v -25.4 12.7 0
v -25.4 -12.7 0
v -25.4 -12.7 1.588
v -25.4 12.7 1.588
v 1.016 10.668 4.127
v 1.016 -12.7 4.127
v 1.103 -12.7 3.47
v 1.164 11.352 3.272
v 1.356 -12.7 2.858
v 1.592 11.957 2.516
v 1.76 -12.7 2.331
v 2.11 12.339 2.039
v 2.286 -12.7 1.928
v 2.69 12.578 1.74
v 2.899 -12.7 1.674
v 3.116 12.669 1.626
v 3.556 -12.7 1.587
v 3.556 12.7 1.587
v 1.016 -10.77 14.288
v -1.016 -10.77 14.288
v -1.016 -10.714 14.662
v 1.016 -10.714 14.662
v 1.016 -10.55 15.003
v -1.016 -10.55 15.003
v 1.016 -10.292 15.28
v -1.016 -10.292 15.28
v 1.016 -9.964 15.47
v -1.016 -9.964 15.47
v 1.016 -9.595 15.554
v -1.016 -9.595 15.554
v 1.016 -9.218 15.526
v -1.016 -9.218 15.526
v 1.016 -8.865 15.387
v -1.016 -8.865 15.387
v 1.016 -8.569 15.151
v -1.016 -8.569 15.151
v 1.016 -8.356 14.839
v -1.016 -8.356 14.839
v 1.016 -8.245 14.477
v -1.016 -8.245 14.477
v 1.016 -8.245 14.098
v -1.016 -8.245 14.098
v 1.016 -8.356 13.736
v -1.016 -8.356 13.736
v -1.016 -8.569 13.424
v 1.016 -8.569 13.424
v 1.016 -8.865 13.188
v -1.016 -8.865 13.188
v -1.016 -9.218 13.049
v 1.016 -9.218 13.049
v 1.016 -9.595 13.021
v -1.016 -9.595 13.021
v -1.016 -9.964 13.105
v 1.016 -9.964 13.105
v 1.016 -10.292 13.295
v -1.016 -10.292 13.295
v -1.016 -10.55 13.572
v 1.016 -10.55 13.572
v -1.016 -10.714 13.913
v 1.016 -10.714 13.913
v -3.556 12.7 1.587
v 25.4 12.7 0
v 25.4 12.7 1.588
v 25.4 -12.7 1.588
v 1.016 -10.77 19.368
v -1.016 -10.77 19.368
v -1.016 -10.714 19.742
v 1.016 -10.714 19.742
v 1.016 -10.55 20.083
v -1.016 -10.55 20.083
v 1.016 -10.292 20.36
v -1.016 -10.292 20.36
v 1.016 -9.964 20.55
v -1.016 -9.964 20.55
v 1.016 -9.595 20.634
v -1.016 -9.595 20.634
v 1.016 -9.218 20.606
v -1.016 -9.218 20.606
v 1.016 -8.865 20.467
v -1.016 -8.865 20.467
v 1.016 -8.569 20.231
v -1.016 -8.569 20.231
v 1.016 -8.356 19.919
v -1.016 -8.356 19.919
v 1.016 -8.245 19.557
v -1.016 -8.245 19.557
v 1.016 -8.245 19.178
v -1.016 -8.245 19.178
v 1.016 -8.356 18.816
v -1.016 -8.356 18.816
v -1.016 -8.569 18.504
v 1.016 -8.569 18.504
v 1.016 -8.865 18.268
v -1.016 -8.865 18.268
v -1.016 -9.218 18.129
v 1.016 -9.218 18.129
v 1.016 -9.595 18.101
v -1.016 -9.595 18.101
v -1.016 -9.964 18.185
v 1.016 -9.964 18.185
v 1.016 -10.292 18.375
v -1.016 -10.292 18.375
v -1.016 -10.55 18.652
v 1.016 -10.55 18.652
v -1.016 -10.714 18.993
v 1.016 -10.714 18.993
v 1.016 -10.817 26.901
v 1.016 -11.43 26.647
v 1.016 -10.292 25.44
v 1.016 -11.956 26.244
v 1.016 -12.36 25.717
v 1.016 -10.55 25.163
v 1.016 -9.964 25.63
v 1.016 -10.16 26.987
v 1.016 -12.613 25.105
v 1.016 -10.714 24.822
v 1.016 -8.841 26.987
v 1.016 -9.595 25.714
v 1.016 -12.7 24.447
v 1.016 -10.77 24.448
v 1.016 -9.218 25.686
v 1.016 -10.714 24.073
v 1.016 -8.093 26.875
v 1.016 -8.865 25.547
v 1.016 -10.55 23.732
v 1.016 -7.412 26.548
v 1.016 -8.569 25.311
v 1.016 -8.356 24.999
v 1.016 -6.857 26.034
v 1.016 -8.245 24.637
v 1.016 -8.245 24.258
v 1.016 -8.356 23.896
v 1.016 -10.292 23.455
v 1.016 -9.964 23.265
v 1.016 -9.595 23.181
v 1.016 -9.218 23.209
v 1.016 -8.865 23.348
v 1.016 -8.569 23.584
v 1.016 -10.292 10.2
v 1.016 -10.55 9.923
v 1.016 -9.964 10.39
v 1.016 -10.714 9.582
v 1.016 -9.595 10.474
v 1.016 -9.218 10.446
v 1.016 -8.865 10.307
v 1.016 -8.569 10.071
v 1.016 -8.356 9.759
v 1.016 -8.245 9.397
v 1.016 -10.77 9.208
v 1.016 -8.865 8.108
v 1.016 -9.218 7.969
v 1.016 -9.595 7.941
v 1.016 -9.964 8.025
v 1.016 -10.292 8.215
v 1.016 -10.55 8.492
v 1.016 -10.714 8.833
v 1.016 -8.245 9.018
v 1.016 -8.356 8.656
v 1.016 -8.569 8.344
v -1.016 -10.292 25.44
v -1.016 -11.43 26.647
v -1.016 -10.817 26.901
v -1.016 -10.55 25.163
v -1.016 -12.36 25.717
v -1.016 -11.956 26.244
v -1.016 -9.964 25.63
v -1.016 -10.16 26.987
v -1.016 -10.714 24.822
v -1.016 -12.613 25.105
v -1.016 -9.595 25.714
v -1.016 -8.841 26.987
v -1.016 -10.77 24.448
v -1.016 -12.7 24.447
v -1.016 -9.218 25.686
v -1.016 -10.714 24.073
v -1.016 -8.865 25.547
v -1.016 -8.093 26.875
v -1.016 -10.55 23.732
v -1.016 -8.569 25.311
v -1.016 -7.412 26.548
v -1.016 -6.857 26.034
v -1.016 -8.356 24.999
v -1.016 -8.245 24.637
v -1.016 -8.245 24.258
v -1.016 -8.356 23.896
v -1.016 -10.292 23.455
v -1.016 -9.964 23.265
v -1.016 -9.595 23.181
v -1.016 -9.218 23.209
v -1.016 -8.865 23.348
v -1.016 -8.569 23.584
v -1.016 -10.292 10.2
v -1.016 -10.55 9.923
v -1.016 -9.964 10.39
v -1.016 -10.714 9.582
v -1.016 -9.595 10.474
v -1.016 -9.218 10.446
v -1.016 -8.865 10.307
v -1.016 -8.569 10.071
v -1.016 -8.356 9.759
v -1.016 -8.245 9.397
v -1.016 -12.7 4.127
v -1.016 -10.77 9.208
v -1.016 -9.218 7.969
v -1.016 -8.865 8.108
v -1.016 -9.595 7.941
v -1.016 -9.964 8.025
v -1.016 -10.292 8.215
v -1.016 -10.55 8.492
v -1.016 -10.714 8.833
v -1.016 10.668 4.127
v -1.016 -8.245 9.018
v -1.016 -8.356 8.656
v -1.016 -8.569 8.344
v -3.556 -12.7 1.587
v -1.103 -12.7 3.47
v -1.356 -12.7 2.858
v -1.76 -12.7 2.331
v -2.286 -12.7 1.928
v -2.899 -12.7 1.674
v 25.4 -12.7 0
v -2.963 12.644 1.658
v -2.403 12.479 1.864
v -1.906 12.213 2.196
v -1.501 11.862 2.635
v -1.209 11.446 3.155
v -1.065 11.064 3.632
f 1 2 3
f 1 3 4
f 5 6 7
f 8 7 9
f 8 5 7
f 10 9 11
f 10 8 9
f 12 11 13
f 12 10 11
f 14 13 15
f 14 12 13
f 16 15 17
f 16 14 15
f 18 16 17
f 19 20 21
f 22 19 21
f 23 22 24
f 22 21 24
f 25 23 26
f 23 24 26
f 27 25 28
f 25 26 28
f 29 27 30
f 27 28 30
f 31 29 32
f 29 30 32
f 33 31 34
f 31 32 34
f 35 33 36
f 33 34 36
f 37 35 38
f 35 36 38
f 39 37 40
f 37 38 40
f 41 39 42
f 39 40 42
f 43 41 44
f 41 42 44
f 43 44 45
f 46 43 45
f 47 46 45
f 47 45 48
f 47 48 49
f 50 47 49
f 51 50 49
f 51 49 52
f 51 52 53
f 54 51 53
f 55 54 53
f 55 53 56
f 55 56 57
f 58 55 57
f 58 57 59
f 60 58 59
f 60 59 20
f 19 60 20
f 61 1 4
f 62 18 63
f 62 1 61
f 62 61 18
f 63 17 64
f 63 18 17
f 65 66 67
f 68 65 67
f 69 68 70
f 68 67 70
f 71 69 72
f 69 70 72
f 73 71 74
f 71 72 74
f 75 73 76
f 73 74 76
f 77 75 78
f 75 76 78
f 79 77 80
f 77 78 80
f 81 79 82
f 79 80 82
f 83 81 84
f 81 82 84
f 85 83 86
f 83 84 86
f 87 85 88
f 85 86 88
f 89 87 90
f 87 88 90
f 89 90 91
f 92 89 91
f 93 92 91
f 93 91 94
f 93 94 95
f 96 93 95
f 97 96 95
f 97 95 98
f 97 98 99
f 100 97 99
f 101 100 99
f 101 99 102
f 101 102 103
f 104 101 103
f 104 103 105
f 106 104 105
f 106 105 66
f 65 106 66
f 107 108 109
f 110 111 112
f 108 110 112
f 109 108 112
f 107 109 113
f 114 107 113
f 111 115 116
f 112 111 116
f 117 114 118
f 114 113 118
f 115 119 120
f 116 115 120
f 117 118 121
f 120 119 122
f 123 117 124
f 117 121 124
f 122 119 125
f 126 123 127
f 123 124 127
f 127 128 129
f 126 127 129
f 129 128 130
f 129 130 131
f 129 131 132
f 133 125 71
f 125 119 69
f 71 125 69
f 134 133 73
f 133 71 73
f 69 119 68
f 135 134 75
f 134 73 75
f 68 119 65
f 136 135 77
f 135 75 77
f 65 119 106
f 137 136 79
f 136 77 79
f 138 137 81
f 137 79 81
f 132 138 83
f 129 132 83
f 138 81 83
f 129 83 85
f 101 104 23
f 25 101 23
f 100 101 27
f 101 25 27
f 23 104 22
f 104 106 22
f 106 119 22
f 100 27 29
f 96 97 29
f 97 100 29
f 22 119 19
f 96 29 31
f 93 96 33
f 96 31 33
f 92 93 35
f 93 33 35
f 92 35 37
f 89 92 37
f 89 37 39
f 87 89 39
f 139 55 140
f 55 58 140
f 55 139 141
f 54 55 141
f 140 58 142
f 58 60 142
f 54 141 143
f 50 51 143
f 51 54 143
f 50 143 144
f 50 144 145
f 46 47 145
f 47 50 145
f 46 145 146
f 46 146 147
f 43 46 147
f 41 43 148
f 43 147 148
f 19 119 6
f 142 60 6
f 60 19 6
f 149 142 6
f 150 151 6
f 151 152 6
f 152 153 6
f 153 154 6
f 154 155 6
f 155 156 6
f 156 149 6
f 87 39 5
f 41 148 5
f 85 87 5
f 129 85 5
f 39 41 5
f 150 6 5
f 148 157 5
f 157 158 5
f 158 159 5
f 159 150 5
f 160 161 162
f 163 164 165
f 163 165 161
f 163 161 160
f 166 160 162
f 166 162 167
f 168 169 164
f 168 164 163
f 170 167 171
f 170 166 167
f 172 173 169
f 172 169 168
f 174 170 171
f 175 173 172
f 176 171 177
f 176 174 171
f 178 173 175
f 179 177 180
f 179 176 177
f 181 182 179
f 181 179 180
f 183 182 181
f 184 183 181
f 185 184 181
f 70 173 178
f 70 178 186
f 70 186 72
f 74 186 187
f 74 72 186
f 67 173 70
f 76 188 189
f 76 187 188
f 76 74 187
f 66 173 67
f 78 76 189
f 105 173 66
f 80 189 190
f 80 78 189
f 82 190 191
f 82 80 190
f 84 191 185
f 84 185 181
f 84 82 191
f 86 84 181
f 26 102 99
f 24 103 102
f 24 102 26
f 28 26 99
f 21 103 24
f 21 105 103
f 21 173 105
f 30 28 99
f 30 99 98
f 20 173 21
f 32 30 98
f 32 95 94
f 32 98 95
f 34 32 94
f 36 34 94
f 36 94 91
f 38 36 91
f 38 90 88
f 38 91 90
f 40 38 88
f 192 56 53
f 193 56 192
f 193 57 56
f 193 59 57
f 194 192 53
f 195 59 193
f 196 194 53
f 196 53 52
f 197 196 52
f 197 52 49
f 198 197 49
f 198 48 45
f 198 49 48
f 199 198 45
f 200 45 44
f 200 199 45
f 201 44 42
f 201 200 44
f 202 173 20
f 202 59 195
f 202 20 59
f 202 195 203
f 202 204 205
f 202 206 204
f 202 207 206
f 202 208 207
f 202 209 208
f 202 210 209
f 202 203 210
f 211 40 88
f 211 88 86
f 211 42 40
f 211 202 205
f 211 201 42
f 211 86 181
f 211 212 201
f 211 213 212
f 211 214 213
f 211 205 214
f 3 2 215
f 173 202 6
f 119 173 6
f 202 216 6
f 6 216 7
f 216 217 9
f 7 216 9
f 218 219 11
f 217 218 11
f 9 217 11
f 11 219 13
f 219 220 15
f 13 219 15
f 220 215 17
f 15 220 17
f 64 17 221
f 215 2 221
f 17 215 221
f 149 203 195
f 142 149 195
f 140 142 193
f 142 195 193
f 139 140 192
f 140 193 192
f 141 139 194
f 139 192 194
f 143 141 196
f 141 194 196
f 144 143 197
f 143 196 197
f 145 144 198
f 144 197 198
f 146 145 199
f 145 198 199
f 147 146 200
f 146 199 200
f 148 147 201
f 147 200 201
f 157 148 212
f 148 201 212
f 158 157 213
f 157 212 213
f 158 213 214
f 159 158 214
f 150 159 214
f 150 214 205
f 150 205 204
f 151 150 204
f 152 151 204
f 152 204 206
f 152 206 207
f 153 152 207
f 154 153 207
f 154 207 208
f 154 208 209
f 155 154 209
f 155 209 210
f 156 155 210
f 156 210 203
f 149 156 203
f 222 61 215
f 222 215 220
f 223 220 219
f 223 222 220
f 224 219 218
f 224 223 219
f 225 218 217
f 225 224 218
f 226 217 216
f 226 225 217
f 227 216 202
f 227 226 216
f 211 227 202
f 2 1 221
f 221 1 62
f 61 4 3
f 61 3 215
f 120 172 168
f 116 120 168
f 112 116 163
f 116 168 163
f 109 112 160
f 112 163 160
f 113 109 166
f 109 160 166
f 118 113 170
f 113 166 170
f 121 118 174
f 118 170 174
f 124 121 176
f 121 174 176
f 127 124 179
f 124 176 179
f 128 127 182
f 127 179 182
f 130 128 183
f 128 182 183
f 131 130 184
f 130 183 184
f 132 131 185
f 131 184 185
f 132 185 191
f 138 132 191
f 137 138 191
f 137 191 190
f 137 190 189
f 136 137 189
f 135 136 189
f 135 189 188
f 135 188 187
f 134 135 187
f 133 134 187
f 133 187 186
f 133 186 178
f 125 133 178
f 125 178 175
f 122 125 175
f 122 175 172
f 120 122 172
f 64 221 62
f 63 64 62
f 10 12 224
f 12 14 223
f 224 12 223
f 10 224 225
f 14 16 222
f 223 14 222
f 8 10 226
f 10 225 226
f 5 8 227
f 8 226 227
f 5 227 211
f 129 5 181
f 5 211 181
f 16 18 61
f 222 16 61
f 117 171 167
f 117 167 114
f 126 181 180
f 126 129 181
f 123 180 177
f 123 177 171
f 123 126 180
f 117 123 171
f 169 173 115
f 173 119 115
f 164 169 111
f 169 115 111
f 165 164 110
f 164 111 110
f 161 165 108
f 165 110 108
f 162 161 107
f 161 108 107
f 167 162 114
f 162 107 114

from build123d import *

# Parameters (mm, degrees)
F0_W     = 50.8
F0_H     = 25.4
F1_DEPTH = 1.5875
F2_W     = 2.032
F2_H     = 25.4
F3_DEPTH = 25.4
F5_DEPTH = 25.4
F6_R     = 2.54
F7_R     = 2.54
F8_R     = 1.27
F9_DEPTH = 25.4


with BuildPart() as f1:
    # F0 (on Top) → F1 (new body)
    with BuildSketch(Plane.XY):
        Rectangle(F0_W, F0_H)
    extrude(amount=F1_DEPTH)

    # F2 (on face) → F3 (join)
    with BuildSketch(Plane.XY.offset(1.5875)):
        Rectangle(F2_W, F2_H)
    extrude(amount=F3_DEPTH)

    # F4 (on face) → F5 (cut)
    with BuildSketch(Plane(origin=(-1.016, 0, 0), x_dir=(0, -1, 0), z_dir=(-1, 0, 0))):
        Polygon((-12.7, 26.9875), (-12.7, 1.5875), (7.62, 26.9875), align=None)
    extrude(amount=-F5_DEPTH, mode=Mode.SUBTRACT)

    # F6
    f6_edges = [f1.edges().sort_by_distance(p)[0] for p in [
        (-1.016, 0, 1.5875),
        (1.016, 0, 1.5875),
    ]]
    fillet(f6_edges, radius=F6_R)

    # F7
    f7_edges = [f1.edges().sort_by_distance(p)[0] for p in [
        (0, -7.62, 26.9875),
        (0, -12.7, 26.9875),
    ]]
    fillet(f7_edges, radius=F7_R)

    # F8 (on face) → F9 (cut)
    with BuildSketch(Plane(origin=(-1.016, 0, 0), x_dir=(0, -1, 0), z_dir=(-1, 0, 0))):
        with Locations((9.5003935563, 24.4475)):
            Circle(F8_R)
        with Locations((9.5003935563, 19.3675)):
            Circle(F8_R)
        with Locations((9.5003935563, 14.2875)):
            Circle(F8_R)
        with Locations((9.5003935563, 9.2075)):
            Circle(F8_R)
    extrude(amount=-F9_DEPTH, mode=Mode.SUBTRACT)


solid = f1.part
